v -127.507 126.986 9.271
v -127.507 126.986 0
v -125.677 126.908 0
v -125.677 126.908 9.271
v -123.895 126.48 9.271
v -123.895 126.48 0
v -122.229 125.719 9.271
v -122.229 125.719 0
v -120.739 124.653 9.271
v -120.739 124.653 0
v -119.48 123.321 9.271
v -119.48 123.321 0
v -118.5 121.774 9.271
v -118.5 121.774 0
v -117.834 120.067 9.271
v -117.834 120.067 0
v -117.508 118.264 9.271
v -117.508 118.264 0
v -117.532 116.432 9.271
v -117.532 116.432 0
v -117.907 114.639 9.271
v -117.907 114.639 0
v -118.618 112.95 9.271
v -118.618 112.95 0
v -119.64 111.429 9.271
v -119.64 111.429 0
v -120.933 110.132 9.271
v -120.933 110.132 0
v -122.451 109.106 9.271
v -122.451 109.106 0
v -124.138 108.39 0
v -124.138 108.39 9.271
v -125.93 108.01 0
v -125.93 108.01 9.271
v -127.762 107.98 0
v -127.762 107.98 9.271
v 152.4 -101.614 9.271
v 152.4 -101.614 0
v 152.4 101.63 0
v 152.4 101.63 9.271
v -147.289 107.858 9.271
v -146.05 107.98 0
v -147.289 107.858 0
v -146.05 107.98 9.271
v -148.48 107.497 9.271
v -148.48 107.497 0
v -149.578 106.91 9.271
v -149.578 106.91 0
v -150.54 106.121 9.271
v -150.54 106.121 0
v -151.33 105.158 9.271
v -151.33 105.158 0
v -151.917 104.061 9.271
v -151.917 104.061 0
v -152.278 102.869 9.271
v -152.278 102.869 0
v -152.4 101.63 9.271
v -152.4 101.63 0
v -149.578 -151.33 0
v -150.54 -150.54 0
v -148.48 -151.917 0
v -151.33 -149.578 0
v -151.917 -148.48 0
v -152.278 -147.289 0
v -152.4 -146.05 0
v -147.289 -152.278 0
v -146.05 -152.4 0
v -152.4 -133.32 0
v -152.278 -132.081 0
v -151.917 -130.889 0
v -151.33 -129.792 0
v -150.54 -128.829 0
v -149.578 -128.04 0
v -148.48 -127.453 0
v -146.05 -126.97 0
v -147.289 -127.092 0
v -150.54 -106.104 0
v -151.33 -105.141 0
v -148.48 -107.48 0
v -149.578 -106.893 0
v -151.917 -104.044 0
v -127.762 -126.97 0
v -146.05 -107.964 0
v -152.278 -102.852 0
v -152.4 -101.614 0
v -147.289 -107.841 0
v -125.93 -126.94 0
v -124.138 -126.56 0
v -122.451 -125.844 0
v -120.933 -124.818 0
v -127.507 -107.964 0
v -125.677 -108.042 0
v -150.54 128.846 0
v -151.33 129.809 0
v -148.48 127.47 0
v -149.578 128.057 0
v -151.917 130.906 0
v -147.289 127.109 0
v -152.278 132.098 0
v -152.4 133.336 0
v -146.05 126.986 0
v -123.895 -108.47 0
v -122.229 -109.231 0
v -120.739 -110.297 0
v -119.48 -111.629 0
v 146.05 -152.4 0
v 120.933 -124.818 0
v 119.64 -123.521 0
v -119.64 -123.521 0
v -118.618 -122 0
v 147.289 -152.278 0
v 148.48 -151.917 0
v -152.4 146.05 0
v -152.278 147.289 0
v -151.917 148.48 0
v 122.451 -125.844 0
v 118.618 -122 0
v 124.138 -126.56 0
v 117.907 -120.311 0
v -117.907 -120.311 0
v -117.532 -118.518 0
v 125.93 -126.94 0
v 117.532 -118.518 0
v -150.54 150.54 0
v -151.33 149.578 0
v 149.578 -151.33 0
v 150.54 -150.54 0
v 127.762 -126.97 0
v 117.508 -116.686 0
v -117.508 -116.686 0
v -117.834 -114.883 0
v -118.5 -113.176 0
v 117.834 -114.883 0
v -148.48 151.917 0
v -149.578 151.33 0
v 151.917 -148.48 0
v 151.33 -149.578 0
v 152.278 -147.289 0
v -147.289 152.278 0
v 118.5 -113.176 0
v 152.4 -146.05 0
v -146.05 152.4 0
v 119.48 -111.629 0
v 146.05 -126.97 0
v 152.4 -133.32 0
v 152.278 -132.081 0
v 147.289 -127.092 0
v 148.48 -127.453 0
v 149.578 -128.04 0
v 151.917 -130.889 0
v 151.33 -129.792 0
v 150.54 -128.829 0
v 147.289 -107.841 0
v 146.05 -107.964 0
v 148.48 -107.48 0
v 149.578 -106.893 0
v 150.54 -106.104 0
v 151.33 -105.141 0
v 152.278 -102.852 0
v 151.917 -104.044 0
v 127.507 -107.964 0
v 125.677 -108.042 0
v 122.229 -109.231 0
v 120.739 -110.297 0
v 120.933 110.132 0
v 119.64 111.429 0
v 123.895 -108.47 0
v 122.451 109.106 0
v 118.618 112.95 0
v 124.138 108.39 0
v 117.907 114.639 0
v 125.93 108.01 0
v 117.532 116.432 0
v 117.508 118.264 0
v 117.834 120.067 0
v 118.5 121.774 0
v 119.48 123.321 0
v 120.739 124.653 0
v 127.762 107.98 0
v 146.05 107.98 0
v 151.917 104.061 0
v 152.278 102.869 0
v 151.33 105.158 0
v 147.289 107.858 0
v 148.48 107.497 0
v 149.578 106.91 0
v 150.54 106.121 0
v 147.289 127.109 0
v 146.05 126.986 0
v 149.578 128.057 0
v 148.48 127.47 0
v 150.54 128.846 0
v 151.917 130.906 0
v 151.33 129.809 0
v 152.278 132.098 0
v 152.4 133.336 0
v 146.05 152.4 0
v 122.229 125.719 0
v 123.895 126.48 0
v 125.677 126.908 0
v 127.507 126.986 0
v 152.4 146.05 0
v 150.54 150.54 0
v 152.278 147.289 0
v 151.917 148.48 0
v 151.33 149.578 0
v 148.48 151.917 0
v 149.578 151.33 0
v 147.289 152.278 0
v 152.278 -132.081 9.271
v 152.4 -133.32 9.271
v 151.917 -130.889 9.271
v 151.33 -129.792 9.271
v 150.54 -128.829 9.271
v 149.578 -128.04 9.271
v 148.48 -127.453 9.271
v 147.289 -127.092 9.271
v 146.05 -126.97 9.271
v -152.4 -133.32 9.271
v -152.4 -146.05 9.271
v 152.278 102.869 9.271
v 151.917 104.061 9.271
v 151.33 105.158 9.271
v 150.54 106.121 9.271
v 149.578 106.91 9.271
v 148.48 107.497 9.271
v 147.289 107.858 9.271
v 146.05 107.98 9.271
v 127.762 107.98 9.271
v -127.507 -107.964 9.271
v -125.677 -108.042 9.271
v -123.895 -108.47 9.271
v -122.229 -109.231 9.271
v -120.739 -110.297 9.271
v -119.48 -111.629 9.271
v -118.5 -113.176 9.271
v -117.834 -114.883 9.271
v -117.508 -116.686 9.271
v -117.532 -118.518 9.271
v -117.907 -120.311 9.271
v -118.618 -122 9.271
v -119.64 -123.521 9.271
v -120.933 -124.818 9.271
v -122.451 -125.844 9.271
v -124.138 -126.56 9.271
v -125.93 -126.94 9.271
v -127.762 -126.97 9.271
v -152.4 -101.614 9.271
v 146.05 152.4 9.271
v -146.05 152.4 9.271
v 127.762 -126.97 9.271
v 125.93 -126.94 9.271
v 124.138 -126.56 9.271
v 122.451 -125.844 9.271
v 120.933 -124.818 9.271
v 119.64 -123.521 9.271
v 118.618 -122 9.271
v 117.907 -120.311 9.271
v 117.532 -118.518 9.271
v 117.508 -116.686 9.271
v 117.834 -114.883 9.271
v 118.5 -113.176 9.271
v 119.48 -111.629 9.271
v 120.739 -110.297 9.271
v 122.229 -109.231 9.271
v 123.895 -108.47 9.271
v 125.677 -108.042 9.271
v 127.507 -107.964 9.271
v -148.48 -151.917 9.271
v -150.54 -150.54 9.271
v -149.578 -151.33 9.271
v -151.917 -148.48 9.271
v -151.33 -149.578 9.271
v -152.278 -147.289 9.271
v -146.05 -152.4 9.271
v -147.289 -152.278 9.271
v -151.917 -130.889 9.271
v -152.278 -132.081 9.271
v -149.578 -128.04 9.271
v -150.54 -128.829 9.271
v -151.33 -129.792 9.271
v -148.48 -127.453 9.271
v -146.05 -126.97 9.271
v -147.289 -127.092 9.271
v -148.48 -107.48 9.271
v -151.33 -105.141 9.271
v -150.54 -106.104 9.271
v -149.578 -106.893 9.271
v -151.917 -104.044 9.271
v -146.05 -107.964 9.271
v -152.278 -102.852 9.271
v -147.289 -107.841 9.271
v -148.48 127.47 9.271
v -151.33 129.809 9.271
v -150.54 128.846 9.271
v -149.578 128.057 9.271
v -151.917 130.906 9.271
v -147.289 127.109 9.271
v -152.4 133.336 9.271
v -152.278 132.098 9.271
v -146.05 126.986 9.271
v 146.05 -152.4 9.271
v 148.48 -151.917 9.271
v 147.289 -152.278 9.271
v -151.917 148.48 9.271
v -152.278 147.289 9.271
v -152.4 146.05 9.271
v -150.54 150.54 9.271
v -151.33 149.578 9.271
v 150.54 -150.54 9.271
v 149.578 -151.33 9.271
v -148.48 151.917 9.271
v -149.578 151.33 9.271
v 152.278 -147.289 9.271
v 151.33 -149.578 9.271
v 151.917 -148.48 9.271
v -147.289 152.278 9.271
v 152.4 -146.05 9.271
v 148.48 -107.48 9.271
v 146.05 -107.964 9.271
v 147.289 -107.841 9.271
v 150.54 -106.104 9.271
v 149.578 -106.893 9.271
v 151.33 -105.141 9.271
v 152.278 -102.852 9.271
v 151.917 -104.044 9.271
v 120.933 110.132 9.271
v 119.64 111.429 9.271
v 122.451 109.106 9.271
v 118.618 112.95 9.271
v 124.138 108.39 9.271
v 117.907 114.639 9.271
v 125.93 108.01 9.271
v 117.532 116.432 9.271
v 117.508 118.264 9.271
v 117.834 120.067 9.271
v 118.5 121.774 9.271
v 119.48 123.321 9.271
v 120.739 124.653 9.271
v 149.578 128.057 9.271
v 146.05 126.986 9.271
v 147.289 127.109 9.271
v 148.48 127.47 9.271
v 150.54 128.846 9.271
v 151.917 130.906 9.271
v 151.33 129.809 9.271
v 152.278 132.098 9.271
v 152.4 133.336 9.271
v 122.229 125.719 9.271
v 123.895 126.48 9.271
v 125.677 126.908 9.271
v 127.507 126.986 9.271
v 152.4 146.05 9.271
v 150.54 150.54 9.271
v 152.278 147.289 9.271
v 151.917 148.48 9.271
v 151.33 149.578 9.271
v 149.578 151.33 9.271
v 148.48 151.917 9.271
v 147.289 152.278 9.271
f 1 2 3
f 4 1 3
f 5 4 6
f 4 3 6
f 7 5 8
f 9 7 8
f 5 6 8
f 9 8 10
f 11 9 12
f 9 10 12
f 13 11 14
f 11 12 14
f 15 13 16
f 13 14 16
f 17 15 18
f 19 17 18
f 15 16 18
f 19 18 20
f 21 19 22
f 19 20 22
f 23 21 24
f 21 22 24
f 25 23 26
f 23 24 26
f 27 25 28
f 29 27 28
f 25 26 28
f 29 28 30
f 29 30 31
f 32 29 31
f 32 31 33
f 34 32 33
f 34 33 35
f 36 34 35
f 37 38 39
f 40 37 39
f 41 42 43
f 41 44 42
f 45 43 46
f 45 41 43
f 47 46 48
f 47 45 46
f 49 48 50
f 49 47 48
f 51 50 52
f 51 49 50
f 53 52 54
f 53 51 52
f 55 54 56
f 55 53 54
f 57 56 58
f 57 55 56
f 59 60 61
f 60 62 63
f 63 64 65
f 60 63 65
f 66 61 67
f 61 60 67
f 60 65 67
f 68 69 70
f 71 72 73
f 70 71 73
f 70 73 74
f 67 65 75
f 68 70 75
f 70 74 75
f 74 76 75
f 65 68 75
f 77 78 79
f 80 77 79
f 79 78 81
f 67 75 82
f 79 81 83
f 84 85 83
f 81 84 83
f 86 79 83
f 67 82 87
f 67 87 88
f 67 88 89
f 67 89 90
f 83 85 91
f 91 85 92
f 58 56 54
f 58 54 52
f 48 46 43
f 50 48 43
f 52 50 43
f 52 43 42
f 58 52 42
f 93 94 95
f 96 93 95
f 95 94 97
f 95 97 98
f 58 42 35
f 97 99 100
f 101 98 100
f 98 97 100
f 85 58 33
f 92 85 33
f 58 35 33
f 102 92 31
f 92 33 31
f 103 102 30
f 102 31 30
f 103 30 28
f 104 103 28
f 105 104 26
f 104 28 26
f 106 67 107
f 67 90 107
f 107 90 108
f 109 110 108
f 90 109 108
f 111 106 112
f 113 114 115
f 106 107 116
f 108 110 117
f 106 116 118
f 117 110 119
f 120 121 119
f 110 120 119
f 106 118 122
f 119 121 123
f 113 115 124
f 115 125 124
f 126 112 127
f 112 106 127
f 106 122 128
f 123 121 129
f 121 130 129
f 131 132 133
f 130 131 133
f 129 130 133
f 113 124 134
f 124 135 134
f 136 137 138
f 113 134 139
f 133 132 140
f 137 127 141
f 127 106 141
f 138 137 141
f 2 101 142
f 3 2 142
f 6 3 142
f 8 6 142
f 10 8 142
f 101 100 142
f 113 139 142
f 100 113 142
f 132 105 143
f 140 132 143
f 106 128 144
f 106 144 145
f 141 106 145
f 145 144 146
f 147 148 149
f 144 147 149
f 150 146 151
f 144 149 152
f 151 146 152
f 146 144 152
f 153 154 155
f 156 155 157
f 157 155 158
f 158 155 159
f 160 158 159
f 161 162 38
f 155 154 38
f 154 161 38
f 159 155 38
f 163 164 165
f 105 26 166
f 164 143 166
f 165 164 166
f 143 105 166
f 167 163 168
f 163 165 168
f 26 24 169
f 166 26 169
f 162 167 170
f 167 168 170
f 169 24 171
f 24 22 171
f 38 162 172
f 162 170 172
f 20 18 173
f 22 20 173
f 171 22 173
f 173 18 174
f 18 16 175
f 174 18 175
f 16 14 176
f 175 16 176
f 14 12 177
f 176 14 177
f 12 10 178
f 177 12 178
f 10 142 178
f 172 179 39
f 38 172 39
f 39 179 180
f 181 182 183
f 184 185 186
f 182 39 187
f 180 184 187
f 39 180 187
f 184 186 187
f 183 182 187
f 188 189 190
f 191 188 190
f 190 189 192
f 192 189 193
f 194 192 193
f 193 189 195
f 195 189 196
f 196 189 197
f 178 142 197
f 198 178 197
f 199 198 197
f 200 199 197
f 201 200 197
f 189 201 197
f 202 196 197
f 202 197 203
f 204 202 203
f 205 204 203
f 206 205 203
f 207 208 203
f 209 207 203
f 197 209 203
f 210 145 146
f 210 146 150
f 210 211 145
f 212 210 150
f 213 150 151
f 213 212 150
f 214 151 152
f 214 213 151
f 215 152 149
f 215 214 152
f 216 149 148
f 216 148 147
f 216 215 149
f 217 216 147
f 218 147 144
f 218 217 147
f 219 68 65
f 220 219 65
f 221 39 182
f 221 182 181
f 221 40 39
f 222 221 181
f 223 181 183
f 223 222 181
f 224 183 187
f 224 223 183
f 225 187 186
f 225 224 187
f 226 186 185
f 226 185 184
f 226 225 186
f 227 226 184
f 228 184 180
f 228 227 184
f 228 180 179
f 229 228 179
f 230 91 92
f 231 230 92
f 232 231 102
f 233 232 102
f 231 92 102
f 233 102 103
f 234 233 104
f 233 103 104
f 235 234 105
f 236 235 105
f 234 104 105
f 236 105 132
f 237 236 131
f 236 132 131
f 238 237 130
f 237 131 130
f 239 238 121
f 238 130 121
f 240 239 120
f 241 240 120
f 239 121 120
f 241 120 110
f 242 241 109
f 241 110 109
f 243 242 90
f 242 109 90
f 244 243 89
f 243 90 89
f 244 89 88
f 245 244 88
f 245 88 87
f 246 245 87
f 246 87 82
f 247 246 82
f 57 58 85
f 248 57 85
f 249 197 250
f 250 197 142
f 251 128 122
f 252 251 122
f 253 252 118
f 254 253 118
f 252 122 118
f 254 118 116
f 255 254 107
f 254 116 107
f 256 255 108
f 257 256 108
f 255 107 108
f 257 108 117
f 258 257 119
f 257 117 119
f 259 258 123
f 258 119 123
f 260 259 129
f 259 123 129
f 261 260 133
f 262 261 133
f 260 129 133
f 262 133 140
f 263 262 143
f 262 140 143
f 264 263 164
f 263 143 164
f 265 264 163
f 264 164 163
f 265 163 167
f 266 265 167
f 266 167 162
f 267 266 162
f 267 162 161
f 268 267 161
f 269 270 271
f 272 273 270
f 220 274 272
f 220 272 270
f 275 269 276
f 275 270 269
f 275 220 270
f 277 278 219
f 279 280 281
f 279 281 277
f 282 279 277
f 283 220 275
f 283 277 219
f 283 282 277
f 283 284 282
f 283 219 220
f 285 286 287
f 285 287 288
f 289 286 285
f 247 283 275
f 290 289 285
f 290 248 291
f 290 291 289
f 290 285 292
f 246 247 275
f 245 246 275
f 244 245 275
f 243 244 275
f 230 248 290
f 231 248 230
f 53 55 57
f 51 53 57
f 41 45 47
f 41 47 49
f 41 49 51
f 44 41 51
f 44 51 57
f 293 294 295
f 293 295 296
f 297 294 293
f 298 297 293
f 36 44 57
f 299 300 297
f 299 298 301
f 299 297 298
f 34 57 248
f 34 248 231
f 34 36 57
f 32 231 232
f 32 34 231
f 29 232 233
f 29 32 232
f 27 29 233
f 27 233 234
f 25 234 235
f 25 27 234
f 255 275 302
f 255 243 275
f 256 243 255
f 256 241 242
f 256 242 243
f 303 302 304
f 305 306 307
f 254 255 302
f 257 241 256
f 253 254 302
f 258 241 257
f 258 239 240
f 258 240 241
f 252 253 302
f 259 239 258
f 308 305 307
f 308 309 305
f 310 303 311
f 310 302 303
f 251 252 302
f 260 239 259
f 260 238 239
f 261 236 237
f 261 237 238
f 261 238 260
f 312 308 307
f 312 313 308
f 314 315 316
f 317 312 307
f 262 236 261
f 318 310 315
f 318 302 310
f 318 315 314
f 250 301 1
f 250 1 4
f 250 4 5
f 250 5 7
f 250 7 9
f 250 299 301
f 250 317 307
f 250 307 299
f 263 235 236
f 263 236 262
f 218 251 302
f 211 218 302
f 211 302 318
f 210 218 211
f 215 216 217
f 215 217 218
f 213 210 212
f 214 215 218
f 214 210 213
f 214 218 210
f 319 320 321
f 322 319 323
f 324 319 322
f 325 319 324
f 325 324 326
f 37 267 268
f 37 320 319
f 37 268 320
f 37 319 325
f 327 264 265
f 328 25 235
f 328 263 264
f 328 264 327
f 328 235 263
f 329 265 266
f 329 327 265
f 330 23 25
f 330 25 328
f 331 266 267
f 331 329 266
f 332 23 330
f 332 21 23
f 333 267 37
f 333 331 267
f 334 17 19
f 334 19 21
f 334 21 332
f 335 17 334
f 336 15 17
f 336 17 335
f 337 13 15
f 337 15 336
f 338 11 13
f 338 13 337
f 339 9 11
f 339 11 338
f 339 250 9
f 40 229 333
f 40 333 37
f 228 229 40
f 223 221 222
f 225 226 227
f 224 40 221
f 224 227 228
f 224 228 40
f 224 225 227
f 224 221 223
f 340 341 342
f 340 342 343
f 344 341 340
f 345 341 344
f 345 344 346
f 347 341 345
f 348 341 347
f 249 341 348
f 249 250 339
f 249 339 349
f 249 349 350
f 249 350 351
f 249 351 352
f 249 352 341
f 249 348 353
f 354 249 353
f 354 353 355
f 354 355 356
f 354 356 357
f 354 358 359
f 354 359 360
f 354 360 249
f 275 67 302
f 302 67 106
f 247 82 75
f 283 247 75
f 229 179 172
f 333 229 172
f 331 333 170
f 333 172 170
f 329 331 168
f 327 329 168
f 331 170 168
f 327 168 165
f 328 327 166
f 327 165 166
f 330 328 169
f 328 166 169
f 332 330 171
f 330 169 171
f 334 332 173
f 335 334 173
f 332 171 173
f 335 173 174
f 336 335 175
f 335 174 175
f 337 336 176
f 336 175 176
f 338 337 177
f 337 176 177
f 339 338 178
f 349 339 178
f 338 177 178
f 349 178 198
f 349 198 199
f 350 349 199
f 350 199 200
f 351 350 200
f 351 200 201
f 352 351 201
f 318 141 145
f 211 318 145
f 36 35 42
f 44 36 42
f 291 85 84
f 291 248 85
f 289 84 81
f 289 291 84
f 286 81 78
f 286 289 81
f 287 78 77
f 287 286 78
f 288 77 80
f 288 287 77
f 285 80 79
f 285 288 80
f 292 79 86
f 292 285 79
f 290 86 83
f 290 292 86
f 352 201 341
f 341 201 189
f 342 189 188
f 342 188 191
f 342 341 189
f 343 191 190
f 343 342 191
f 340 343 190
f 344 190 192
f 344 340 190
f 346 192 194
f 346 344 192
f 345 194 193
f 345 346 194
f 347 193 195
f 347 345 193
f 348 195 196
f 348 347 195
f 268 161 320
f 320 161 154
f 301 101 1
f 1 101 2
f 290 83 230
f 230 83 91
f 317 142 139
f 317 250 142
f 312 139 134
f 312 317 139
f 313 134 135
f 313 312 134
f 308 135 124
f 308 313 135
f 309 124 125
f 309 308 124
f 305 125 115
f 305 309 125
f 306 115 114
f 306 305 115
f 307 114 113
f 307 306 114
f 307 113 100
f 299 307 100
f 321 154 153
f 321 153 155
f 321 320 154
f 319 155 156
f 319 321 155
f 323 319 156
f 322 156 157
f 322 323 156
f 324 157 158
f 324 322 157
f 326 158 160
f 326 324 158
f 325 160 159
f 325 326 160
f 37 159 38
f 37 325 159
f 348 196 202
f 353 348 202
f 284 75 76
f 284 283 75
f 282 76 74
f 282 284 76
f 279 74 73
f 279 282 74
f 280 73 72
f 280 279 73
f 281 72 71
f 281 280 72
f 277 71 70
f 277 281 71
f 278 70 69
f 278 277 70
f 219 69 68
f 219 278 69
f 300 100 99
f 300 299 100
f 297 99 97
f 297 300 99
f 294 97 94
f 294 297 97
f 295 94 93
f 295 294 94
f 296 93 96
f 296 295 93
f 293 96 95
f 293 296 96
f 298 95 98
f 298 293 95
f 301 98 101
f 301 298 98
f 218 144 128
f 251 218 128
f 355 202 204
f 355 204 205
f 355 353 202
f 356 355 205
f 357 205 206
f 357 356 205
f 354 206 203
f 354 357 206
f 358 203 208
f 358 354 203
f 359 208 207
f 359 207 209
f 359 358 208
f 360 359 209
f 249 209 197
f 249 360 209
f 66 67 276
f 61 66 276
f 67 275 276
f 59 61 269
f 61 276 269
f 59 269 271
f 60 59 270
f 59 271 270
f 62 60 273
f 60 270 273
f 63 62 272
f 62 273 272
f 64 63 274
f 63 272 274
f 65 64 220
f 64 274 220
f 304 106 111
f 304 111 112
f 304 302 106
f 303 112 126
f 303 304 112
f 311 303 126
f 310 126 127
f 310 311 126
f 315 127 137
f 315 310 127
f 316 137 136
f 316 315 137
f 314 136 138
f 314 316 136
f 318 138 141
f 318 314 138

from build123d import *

# Parameters (mm, degrees)
F1_DEPTH = 9.271
F2_R     = 6.35


with BuildPart() as f1:
    # F0 (on Top) → F1 (new body)
    with BuildSketch(Plane.XY):
        with BuildLine():
            Line((-152.4, -152.4), (0, -152.4))
            Line((0, -152.4), (152.4, -152.4))
            Line((152.4, -152.4), (152.4, -126.969507))
            Line((152.4, -126.969507), (127.761554, -126.969507))
            ThreePointArc((127.761554, -126.969507), (117.475854, -117.602548), (127.507025, -107.963504))
            Line((127.507025, -107.963504), (152.4, -107.963504))
            Line((152.4, -107.963504), (152.4, 107.980493))
            Line((152.4, 107.980493), (127.761554, 107.980493))
            ThreePointArc((127.761554, 107.980493), (117.475854, 117.347452), (127.507025, 126.986496))
            Line((127.507025, 126.986496), (152.4, 126.986496))
            Line((152.4, 126.986496), (152.4, 152.4))
            Line((152.4, 152.4), (0, 152.4))
            Line((0, 152.4), (-152.4, 152.4))
            Line((-152.4, 152.4), (-152.4, 126.986496))
            Line((-152.4, 126.986496), (-127.507025, 126.986496))
            ThreePointArc((-127.507025, 126.986496), (-117.475854, 117.347452), (-127.761554, 107.980493))
            Line((-127.761554, 107.980493), (-152.4, 107.980493))
            Line((-152.4, 107.980493), (-152.4, -107.963504))
            Line((-152.4, -107.963504), (-127.507025, -107.963504))
            ThreePointArc((-127.507025, -107.963504), (-117.475854, -117.602548), (-127.761554, -126.969507))
            Line((-127.761554, -126.969507), (-152.4, -126.969507))
            Line((-152.4, -126.969507), (-152.4, -152.4))
        make_face()
    extrude(amount=F1_DEPTH)

    # F2
    f2_edges = [f1.edges().sort_by_distance(p)[0] for p in [
        (-152.4, 152.4, 4.6355),
        (152.4, 152.4, 4.6355),
        (152.4, -152.4, 4.6355),
        (-152.4, -152.4, 4.6355),
        (152.4, -126.969507, 4.6355),
        (152.4, -107.963504, 4.6355),
        (152.4, 107.980493, 4.6355),
        (152.4, 126.986496, 4.6355),
        (-152.4, -107.963504, 4.6355),
        (-152.4, 126.986496, 4.6355),
        (-152.4, -126.969507, 4.6355),
        (-152.4, 107.980493, 4.6355),
    ]]
    fillet(f2_edges, radius=F2_R)


solid = f1.part
